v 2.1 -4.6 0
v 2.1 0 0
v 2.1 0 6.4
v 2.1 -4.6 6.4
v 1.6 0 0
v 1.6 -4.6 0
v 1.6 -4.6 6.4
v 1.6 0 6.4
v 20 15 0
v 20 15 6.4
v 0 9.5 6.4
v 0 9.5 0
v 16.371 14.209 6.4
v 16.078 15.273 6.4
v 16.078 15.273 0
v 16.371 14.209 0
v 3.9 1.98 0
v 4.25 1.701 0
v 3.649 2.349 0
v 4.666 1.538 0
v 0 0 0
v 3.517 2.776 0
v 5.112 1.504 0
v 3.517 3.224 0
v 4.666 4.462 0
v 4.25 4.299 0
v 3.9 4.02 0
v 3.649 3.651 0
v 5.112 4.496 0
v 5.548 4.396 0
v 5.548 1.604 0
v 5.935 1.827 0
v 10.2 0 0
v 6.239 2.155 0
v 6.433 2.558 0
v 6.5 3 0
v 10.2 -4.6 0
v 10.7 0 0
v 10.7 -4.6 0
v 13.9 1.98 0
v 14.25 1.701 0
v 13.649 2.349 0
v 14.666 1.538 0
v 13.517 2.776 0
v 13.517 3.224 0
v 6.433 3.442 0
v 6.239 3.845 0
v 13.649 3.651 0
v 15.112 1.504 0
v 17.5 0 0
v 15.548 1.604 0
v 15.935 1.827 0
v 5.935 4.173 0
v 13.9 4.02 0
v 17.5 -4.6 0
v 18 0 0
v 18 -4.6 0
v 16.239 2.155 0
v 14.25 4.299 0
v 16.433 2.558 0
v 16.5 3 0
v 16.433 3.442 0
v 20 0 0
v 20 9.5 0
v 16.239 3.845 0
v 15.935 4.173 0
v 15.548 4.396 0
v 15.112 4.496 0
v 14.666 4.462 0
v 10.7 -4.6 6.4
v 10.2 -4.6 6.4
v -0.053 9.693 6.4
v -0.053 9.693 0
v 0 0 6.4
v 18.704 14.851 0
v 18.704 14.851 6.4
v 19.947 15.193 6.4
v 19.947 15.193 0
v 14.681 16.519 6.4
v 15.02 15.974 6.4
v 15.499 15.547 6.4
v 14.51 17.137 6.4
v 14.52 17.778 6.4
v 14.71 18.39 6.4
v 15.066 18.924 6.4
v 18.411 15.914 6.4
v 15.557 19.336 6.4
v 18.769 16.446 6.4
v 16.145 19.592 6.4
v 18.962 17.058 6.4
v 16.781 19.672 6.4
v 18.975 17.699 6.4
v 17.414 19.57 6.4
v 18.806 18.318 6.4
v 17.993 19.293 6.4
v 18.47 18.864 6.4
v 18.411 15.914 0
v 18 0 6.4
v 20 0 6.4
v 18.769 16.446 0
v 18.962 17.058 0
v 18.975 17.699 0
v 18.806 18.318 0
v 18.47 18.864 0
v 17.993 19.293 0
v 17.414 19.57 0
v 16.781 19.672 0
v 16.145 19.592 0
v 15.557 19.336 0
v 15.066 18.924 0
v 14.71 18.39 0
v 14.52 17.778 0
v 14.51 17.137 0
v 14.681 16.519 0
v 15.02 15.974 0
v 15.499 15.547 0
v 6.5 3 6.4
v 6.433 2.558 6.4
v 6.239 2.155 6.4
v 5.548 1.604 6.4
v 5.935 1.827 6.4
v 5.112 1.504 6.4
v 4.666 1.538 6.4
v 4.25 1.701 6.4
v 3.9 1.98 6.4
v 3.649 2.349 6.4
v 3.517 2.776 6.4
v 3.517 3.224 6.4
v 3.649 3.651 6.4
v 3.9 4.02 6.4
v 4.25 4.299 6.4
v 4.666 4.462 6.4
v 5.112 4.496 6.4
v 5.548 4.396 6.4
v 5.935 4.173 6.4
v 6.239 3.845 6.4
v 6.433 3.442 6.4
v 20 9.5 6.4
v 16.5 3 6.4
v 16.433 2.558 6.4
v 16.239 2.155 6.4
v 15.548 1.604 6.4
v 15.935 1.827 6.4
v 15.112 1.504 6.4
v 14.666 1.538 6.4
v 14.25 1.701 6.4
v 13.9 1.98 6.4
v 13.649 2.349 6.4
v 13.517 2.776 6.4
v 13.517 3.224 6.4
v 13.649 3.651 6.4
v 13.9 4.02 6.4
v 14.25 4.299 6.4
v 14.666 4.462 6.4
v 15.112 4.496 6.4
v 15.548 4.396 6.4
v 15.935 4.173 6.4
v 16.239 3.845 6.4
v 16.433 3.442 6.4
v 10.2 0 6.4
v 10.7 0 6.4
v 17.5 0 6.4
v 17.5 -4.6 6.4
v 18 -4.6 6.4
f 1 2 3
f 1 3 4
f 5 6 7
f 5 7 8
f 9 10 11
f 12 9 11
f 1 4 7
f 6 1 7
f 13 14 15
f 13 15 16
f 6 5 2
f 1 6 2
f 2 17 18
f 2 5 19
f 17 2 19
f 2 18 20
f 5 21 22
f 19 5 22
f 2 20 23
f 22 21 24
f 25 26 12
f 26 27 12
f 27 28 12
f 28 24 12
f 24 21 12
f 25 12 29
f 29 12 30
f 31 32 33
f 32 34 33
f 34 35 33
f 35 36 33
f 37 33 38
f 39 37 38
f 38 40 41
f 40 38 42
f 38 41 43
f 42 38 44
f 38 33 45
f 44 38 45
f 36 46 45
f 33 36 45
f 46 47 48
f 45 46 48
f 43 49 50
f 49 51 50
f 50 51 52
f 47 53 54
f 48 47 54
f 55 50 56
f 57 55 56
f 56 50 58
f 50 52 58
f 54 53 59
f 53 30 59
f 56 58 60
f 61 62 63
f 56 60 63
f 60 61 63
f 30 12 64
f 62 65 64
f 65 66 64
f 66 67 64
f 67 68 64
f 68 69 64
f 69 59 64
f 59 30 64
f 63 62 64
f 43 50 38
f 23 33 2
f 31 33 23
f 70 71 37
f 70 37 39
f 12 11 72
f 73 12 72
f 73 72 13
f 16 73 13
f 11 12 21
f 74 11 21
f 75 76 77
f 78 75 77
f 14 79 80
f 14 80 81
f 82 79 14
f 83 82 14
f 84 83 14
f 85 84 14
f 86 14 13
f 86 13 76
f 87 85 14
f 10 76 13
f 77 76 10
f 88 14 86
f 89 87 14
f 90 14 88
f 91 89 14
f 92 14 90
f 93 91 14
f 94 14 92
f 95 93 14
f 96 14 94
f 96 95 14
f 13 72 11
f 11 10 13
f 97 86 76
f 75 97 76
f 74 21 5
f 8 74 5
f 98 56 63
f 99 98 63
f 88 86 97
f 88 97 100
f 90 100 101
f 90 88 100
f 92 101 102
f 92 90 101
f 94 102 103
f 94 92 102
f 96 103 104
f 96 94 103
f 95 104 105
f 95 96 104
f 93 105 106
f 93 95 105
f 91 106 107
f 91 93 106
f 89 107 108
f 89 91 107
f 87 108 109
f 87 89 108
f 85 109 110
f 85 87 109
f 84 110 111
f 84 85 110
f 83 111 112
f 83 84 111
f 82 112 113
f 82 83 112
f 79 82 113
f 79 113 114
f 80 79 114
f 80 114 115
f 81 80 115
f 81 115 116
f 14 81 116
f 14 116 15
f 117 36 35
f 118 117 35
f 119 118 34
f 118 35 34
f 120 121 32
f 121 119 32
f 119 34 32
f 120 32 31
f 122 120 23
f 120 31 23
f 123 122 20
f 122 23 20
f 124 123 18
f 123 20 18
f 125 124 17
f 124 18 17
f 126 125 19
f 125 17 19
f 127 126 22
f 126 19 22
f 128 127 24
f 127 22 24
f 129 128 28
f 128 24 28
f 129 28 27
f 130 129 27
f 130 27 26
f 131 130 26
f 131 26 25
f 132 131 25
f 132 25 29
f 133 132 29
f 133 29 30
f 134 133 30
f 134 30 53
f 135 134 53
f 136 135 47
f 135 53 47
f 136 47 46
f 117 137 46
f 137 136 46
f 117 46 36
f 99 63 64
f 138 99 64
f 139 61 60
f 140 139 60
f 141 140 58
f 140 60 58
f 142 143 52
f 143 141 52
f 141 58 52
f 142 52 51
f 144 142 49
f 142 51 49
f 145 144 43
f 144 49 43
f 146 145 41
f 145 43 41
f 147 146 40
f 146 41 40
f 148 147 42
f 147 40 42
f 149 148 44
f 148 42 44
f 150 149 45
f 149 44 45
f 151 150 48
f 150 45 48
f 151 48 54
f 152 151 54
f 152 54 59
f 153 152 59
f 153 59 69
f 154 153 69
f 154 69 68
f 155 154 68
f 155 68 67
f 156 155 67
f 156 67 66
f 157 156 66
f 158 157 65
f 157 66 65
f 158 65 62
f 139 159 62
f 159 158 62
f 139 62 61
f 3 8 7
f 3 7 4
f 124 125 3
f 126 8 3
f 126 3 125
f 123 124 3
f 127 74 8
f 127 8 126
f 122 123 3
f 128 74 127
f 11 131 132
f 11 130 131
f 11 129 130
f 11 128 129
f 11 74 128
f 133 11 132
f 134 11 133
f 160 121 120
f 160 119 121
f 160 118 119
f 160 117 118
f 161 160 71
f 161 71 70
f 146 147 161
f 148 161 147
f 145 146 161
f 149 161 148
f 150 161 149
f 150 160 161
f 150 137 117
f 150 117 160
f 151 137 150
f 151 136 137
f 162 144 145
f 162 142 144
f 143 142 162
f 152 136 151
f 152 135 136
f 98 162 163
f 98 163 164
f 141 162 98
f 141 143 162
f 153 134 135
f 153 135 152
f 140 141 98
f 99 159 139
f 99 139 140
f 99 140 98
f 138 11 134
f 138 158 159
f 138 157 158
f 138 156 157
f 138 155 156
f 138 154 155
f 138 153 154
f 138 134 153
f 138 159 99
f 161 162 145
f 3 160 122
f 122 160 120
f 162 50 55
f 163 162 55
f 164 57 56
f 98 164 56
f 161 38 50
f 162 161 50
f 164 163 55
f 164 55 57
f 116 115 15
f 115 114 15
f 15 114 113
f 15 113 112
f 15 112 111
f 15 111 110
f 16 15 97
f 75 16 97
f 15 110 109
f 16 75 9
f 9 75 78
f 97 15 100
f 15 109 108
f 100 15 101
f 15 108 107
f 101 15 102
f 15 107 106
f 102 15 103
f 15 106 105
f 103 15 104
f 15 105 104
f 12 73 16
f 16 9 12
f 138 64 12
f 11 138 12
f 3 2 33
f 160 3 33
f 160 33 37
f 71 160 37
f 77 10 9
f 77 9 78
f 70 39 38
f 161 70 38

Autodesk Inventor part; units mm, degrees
ref_plane "YZ Plane" through (0, 0, 0) normal (1, 0, 0) x (0, 1, 0)
ref_plane "XZ Plane" through (0, 0, 0) normal (0, 1, 0) x (-1, 0, 0)
ref_plane "XY Plane" through (0, 0, 0) normal (0, 0, 1) x (1, 0, 0)
sketch "Sketch1" plane through (0, 0, 0) normal (0, 0, 1) x (1, 0, 0)
  line L0 (0, 0) -> (20, 0)
  line L1 (20, 0) -> (20, 9.5)
  line L2 (20, 9.5) -> (0, 9.5)
  line L3 (0, 9.5) -> (0, 0)
  circle A0 centre (5, 3) radius 1.5
  circle A1 centre (15, 3) radius 1.5
  dimension "d0" = 20
  dimension "d1" = 9.5
  dimension "d4" = 3
  dimension "d5" = 3
  dimension "d6" = 5
extrude "Extrusion1" add sketch "Sketch1" along normal blind 6.4
sketch "Sketch2" plane through (0, 0, 6.4) normal (0, 0, 1) x (1, 0, 0)
  line L0 (20, 0) -> (20, 9.5) projected
  line L1 (20, 9.5) -> (20, 15)
  line L2 (20, 9.5) -> (0, 9.5) projected
  line L3 (20, 15) -> (0, 9.5)
  line L4 (0, 9.5) -> (-0.053, 9.6928)
  line L5 (20, 15) -> (19.947, 15.1928)
  line L6 (-0.053, 9.6928) -> (19.947, 15.1928)
  circle A0 centre (16.7417, 17.4228) radius 2.25
  line L7 (15.8961, 15.9357) -> (16.3709, 14.2094)
  line L8 (18.2287, 16.5772) -> (18.7035, 14.8509)
  arc A1 (18.2287, 16.5772) -> (15.8961, 15.9357) centre (17.0624, 16.2565) ccw
  point P0 (0, 0)
  point P1 (18.4111, 15.9142)
  point P2 (16.0785, 15.2727)
  dimension "d7" = 5.5
  dimension "d8" = 0.2
  dimension "d9" = 270
  dimension "d10" = 0.2
  dimension "d13" = 4.5
  dimension "d28" = 3
extrude "Extrusion2" add sketch "Sketch2" against normal blind 6.4 contours L3 L4 L6 L5 | L6 L7 A0 L8 | L8 A1 L7 A0 | A0 L7 A1 L8
sketch "Sketch3" plane through (0, 0, 6.4) normal (0, 0, 1) x (1, 0, 0)
  line L0 (1.6, 0) -> (2.1, 0)
  line L1 (2.1, 0) -> (2.1, -4.6)
  line L2 (2.1, -4.6) -> (1.6, -4.6)
  line L3 (1.6, -4.6) -> (1.6, 0)
  line L4 (0, 0) -> (20, 0) projected
  line L5 (10.7, 0) -> (10.2, 0)
  line L6 (10.2, 0) -> (10.2, -4.6)
  line L7 (10.2, -4.6) -> (10.7, -4.6)
  line L8 (10.7, -4.6) -> (10.7, 0)
  line L9 (18, 0) -> (17.5, 0)
  line L10 (17.5, 0) -> (17.5, -4.6)
  line L11 (17.5, -4.6) -> (18, -4.6)
  line L12 (18, -4.6) -> (18, 0)
  line L13 (0, 9.5) -> (0, 0) projected
  dimension "d16" = 1.6
  dimension "d17" = 0.5
  dimension "d18" = 4.6
  dimension "d20" = 0.5
  dimension "d21" = 8.1
  dimension "d23" = 0.5
  dimension "d24" = 6.8
  dimension "d25" = 4.6
extrude "Extrusion3" add sketch "Sketch3" against normal blind 6.4
properties part number "00_MicroSwitch"
